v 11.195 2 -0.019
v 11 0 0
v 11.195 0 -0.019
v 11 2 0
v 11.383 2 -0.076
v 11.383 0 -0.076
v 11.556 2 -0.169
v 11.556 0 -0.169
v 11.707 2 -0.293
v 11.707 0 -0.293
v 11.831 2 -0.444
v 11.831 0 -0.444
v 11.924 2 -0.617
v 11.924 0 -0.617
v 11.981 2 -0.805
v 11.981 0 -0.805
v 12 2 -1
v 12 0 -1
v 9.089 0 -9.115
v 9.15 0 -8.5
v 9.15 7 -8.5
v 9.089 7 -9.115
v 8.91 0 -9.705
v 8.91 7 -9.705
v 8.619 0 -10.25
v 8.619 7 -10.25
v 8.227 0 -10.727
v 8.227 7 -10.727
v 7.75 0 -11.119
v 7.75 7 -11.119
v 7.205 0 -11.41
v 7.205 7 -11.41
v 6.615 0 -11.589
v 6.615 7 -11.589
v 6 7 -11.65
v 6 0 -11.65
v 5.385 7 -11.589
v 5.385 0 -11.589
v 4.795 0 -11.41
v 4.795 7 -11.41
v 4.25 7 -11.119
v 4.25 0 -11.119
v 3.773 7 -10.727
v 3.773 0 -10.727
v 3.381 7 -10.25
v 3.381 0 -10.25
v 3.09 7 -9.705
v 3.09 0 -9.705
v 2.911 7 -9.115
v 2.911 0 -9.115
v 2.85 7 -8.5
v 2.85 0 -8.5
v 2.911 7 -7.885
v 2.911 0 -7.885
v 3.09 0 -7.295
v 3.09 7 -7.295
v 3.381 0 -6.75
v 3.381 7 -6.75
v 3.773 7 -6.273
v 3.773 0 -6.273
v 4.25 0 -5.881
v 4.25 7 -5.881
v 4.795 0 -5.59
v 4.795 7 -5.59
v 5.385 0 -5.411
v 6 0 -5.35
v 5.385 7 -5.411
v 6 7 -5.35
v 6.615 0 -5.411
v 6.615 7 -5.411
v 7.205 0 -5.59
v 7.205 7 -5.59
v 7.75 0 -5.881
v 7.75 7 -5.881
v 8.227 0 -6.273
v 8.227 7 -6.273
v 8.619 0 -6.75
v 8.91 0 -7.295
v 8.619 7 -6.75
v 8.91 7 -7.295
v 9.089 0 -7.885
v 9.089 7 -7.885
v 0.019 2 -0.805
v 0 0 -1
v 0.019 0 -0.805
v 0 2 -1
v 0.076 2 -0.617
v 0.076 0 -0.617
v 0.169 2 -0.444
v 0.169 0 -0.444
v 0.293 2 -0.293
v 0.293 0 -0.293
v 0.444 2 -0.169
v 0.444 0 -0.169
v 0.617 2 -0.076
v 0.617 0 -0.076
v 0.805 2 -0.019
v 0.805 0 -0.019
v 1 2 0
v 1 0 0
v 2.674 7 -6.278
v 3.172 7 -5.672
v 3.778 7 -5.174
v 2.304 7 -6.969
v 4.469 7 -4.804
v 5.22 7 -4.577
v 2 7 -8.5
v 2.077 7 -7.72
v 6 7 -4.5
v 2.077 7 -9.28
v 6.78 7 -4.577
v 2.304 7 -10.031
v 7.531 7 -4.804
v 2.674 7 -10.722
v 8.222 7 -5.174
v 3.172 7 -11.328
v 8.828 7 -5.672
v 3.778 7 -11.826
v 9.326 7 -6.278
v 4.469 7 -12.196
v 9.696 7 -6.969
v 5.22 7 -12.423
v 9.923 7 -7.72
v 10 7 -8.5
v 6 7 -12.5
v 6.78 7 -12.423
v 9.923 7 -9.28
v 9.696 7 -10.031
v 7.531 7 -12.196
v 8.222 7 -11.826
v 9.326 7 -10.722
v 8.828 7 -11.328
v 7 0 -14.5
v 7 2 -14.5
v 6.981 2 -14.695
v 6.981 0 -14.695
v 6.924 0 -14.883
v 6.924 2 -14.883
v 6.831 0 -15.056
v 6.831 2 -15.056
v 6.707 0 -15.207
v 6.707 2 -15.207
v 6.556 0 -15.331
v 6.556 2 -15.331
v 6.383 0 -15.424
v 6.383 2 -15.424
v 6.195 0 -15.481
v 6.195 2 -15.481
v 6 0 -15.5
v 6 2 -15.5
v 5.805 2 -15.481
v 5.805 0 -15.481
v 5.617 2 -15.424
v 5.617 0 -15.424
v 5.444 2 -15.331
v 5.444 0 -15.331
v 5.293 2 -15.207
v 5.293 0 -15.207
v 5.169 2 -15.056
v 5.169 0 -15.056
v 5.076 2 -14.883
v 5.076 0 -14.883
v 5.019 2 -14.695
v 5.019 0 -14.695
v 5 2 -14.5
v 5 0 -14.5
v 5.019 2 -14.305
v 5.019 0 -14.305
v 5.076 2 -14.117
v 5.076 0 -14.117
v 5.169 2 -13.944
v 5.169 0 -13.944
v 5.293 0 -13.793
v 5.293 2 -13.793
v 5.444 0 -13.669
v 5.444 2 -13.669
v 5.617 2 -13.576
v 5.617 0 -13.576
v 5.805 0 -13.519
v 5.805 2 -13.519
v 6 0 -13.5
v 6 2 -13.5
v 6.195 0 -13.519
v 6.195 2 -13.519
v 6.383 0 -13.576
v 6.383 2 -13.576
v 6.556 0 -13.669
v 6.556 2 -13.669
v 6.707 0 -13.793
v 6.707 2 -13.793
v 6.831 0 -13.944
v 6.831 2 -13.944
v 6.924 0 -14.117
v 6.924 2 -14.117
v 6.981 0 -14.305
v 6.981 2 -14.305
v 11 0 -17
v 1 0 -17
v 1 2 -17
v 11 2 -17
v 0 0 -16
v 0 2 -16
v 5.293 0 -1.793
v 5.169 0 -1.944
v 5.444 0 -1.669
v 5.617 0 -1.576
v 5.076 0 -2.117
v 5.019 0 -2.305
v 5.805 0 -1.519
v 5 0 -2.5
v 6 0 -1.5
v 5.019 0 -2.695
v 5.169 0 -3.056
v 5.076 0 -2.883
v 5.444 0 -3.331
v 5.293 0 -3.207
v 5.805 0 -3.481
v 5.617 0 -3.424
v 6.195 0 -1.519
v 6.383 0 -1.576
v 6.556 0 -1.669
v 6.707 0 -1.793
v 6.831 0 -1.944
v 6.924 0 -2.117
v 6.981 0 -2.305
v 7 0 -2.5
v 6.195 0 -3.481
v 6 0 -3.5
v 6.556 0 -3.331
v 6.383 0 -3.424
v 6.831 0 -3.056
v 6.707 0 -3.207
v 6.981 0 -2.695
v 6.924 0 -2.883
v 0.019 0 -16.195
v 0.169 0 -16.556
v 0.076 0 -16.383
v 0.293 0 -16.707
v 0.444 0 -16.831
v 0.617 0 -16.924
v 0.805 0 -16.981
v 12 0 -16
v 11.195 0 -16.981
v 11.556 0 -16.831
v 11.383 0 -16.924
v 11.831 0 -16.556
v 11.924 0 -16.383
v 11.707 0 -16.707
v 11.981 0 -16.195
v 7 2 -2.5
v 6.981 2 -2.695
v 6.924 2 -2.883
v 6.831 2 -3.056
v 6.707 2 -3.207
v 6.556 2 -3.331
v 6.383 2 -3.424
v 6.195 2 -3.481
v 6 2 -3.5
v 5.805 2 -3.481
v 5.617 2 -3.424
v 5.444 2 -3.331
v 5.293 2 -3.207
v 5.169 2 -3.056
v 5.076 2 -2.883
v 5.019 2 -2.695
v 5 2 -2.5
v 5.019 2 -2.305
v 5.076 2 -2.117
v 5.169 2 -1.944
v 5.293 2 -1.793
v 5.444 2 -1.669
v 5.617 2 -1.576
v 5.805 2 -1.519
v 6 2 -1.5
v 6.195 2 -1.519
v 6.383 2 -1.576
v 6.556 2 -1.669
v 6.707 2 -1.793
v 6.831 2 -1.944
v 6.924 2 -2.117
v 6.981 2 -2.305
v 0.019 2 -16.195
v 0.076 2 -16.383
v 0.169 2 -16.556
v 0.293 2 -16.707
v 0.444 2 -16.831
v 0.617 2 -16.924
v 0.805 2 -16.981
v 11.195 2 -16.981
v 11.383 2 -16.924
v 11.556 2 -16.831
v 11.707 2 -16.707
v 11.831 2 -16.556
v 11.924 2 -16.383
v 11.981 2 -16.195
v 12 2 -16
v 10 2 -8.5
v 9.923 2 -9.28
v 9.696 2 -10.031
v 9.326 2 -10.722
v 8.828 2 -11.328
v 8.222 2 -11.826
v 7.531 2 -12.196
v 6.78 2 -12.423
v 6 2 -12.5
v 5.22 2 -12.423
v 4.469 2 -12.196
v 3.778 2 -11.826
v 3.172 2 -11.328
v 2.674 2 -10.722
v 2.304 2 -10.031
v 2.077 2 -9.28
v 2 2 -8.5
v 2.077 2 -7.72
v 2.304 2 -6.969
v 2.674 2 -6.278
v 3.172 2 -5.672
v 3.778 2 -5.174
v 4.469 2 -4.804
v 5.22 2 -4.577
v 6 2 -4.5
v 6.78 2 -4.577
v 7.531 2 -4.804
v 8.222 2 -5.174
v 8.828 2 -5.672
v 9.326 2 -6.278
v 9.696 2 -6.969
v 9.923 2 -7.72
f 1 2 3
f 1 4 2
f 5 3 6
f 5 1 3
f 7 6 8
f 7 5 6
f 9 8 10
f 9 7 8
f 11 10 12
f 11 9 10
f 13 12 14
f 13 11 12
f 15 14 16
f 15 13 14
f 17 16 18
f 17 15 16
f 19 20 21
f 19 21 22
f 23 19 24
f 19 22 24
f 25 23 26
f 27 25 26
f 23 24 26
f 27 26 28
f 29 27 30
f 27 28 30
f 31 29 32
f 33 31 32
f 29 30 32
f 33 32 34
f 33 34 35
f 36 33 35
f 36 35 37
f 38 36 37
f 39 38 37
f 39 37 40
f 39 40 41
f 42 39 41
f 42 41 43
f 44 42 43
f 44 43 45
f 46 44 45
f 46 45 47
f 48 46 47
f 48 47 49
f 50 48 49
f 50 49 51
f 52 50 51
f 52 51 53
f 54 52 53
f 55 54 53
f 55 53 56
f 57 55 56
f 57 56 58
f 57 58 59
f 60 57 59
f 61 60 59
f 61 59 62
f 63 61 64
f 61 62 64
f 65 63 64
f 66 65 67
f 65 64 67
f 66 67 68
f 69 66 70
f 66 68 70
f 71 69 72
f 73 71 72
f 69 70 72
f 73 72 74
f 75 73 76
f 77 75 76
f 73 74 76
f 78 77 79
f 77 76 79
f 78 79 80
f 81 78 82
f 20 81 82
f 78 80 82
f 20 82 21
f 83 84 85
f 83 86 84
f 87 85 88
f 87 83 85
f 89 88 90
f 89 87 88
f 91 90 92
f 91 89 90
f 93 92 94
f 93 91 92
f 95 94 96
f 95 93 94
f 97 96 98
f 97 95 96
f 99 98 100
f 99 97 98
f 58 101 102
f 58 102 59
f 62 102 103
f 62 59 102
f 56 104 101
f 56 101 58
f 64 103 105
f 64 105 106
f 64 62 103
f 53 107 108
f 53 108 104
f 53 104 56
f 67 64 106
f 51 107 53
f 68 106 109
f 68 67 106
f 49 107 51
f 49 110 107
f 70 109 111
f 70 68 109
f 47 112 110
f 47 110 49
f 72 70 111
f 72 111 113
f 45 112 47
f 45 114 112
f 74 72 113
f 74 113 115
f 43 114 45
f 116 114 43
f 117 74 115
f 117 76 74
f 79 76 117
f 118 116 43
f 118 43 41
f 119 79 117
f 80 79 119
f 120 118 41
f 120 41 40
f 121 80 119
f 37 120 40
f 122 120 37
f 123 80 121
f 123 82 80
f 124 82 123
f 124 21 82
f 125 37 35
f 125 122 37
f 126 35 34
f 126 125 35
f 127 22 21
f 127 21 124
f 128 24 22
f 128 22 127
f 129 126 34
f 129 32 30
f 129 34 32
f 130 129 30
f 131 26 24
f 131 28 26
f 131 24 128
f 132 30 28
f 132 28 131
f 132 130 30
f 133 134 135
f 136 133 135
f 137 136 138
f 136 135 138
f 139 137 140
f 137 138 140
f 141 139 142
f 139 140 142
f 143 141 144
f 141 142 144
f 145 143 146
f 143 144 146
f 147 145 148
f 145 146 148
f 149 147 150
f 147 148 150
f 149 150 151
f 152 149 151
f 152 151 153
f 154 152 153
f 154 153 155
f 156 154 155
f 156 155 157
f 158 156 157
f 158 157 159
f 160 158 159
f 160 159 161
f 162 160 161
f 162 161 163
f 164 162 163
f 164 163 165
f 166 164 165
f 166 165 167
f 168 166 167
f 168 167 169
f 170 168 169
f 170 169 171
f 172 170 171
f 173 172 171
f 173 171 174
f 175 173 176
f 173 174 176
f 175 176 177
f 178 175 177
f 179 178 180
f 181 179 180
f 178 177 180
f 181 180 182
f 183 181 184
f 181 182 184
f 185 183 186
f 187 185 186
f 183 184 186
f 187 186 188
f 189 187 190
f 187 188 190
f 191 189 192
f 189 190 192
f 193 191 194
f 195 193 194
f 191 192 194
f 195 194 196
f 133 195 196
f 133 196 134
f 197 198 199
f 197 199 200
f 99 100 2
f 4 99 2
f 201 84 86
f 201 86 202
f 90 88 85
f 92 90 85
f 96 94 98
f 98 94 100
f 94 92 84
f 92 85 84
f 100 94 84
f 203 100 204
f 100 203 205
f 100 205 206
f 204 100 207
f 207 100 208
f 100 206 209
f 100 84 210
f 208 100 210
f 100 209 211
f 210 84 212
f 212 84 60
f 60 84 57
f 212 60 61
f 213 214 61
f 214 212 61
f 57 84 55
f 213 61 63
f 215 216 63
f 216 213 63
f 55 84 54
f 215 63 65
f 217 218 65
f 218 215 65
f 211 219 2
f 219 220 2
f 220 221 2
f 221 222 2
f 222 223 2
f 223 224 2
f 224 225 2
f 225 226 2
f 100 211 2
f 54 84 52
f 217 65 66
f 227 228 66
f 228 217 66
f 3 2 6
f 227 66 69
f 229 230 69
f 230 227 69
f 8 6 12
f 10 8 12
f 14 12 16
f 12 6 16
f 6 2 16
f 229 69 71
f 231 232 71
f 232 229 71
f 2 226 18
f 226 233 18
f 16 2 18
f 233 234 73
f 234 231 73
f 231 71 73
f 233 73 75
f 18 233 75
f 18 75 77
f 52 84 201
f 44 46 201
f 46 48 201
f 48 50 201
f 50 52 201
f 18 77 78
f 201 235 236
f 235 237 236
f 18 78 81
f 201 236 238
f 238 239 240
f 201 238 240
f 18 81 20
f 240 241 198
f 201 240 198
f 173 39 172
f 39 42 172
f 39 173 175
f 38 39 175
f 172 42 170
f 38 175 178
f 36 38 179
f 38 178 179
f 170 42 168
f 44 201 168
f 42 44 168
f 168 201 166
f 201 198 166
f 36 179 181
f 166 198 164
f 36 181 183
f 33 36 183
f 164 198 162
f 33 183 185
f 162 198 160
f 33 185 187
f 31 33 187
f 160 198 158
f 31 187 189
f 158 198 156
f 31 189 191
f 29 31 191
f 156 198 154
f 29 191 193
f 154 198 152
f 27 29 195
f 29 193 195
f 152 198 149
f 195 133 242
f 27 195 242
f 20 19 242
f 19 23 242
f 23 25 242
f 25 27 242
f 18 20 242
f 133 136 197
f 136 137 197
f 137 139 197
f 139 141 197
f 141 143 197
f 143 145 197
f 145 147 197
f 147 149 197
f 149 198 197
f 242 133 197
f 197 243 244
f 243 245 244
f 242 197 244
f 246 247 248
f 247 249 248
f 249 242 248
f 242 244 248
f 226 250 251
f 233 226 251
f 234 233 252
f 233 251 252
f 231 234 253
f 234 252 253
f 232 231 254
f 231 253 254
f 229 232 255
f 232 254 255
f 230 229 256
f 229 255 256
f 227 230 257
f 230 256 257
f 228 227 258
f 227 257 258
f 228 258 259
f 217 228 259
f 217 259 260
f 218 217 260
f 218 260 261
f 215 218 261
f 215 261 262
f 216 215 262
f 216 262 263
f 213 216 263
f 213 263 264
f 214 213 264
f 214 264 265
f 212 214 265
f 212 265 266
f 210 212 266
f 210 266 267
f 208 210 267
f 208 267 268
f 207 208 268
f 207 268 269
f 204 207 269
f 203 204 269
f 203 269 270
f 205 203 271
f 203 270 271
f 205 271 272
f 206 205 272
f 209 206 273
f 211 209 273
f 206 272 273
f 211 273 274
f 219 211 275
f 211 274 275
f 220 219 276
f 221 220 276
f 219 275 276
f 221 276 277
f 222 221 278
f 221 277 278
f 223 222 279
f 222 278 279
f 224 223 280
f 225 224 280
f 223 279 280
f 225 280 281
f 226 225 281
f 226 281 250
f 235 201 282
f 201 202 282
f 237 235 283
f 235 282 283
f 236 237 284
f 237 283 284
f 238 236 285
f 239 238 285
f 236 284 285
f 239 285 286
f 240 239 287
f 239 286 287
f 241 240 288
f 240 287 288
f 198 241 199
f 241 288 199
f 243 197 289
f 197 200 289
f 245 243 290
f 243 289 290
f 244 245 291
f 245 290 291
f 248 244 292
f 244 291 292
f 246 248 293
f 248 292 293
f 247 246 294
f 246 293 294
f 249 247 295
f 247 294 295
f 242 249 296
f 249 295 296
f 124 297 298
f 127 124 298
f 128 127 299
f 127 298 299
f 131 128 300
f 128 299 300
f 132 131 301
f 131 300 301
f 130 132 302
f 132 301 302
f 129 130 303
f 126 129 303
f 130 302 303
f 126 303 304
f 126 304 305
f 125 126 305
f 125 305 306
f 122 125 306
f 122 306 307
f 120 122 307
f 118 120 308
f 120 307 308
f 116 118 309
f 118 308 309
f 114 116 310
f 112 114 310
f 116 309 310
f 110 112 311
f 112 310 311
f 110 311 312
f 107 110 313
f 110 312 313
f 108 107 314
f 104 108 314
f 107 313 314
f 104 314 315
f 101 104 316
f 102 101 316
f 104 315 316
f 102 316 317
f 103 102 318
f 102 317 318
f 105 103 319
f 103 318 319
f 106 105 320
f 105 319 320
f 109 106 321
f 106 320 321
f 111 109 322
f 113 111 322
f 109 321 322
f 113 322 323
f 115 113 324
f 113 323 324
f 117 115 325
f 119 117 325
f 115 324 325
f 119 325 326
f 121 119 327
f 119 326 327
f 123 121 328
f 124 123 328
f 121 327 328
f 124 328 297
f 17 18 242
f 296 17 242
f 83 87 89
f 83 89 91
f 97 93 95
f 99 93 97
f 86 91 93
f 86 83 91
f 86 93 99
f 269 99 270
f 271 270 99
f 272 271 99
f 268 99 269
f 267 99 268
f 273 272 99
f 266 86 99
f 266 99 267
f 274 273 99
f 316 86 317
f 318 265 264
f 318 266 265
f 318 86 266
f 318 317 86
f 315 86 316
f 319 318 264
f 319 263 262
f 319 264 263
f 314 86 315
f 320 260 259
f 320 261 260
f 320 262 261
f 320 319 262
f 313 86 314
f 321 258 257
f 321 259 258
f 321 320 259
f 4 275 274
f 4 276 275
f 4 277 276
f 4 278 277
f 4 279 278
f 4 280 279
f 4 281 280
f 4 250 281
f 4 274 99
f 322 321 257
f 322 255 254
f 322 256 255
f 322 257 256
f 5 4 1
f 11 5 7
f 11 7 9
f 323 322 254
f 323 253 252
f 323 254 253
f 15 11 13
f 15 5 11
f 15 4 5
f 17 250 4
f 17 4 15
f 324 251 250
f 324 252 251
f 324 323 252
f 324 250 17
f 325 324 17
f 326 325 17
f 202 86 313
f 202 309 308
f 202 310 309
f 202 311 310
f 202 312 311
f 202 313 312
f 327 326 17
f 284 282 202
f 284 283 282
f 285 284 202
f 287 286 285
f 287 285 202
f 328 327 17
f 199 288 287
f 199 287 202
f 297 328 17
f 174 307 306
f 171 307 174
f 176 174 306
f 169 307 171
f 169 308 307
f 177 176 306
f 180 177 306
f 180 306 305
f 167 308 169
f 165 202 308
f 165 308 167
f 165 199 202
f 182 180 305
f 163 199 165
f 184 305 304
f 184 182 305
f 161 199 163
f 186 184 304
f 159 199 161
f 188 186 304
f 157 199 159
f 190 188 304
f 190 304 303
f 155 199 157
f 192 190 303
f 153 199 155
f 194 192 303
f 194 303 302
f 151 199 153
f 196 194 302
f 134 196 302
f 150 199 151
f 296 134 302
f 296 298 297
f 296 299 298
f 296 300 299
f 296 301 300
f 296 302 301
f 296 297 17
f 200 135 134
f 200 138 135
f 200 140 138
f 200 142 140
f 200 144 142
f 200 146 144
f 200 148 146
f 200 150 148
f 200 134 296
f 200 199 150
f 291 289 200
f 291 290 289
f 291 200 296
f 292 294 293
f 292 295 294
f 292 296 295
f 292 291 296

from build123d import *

# Parameters (mm, degrees)
SKETCH1_W               = 12
SKETCH1_H               = 17
MAIN_BODY_DEPTH         = 2
SKETCH2_R               = 4
SPACER_MOUNT_DEPTH      = 5
SKETCH3_R               = 3.15
SKETCH3_R_2             = 1
BOLT_SPACER_HOLES_DEPTH = 8
FILLET1_R               = 1


with BuildPart() as part:
    # Sketch1 → main_body (new body)
    with BuildSketch(Plane(origin=(0, 0, 0), x_dir=(1, 0, 0), z_dir=(0, 1, 0))):
        with Locations((6, 8.5)):
            Rectangle(SKETCH1_W, SKETCH1_H)
    extrude(amount=MAIN_BODY_DEPTH)

    # Sketch2 → spacer_mount (add)
    with BuildSketch(Plane(origin=(0, 2, 0), x_dir=(1, 0, 0), z_dir=(0, 1, 0))):
        with Locations((6, 8.5)):
            Circle(SKETCH2_R)
    extrude(amount=SPACER_MOUNT_DEPTH)

    # Sketch3 → bolt_spacer_holes (cut, through all)
    with BuildSketch(Plane(origin=(0, 7, 0), x_dir=(1, 0, 0), z_dir=(0, 1, 0))):
        with Locations((6, 8.5)):
            Circle(SKETCH3_R)
        with Locations((6, 14.5)):
            Circle(SKETCH3_R_2)
        with Locations((6, 2.5)):
            Circle(SKETCH3_R_2)
    extrude(amount=-BOLT_SPACER_HOLES_DEPTH, mode=Mode.SUBTRACT)

    # Fillet1
    fillet1_edges = [part.edges().sort_by_distance(p)[0] for p in [
        (0, 1, -17),
        (12, 1, -17),
        (12, 1, 0),
        (0, 1, 0),
    ]]
    fillet(fillet1_edges, radius=FILLET1_R)


solid = part.part
